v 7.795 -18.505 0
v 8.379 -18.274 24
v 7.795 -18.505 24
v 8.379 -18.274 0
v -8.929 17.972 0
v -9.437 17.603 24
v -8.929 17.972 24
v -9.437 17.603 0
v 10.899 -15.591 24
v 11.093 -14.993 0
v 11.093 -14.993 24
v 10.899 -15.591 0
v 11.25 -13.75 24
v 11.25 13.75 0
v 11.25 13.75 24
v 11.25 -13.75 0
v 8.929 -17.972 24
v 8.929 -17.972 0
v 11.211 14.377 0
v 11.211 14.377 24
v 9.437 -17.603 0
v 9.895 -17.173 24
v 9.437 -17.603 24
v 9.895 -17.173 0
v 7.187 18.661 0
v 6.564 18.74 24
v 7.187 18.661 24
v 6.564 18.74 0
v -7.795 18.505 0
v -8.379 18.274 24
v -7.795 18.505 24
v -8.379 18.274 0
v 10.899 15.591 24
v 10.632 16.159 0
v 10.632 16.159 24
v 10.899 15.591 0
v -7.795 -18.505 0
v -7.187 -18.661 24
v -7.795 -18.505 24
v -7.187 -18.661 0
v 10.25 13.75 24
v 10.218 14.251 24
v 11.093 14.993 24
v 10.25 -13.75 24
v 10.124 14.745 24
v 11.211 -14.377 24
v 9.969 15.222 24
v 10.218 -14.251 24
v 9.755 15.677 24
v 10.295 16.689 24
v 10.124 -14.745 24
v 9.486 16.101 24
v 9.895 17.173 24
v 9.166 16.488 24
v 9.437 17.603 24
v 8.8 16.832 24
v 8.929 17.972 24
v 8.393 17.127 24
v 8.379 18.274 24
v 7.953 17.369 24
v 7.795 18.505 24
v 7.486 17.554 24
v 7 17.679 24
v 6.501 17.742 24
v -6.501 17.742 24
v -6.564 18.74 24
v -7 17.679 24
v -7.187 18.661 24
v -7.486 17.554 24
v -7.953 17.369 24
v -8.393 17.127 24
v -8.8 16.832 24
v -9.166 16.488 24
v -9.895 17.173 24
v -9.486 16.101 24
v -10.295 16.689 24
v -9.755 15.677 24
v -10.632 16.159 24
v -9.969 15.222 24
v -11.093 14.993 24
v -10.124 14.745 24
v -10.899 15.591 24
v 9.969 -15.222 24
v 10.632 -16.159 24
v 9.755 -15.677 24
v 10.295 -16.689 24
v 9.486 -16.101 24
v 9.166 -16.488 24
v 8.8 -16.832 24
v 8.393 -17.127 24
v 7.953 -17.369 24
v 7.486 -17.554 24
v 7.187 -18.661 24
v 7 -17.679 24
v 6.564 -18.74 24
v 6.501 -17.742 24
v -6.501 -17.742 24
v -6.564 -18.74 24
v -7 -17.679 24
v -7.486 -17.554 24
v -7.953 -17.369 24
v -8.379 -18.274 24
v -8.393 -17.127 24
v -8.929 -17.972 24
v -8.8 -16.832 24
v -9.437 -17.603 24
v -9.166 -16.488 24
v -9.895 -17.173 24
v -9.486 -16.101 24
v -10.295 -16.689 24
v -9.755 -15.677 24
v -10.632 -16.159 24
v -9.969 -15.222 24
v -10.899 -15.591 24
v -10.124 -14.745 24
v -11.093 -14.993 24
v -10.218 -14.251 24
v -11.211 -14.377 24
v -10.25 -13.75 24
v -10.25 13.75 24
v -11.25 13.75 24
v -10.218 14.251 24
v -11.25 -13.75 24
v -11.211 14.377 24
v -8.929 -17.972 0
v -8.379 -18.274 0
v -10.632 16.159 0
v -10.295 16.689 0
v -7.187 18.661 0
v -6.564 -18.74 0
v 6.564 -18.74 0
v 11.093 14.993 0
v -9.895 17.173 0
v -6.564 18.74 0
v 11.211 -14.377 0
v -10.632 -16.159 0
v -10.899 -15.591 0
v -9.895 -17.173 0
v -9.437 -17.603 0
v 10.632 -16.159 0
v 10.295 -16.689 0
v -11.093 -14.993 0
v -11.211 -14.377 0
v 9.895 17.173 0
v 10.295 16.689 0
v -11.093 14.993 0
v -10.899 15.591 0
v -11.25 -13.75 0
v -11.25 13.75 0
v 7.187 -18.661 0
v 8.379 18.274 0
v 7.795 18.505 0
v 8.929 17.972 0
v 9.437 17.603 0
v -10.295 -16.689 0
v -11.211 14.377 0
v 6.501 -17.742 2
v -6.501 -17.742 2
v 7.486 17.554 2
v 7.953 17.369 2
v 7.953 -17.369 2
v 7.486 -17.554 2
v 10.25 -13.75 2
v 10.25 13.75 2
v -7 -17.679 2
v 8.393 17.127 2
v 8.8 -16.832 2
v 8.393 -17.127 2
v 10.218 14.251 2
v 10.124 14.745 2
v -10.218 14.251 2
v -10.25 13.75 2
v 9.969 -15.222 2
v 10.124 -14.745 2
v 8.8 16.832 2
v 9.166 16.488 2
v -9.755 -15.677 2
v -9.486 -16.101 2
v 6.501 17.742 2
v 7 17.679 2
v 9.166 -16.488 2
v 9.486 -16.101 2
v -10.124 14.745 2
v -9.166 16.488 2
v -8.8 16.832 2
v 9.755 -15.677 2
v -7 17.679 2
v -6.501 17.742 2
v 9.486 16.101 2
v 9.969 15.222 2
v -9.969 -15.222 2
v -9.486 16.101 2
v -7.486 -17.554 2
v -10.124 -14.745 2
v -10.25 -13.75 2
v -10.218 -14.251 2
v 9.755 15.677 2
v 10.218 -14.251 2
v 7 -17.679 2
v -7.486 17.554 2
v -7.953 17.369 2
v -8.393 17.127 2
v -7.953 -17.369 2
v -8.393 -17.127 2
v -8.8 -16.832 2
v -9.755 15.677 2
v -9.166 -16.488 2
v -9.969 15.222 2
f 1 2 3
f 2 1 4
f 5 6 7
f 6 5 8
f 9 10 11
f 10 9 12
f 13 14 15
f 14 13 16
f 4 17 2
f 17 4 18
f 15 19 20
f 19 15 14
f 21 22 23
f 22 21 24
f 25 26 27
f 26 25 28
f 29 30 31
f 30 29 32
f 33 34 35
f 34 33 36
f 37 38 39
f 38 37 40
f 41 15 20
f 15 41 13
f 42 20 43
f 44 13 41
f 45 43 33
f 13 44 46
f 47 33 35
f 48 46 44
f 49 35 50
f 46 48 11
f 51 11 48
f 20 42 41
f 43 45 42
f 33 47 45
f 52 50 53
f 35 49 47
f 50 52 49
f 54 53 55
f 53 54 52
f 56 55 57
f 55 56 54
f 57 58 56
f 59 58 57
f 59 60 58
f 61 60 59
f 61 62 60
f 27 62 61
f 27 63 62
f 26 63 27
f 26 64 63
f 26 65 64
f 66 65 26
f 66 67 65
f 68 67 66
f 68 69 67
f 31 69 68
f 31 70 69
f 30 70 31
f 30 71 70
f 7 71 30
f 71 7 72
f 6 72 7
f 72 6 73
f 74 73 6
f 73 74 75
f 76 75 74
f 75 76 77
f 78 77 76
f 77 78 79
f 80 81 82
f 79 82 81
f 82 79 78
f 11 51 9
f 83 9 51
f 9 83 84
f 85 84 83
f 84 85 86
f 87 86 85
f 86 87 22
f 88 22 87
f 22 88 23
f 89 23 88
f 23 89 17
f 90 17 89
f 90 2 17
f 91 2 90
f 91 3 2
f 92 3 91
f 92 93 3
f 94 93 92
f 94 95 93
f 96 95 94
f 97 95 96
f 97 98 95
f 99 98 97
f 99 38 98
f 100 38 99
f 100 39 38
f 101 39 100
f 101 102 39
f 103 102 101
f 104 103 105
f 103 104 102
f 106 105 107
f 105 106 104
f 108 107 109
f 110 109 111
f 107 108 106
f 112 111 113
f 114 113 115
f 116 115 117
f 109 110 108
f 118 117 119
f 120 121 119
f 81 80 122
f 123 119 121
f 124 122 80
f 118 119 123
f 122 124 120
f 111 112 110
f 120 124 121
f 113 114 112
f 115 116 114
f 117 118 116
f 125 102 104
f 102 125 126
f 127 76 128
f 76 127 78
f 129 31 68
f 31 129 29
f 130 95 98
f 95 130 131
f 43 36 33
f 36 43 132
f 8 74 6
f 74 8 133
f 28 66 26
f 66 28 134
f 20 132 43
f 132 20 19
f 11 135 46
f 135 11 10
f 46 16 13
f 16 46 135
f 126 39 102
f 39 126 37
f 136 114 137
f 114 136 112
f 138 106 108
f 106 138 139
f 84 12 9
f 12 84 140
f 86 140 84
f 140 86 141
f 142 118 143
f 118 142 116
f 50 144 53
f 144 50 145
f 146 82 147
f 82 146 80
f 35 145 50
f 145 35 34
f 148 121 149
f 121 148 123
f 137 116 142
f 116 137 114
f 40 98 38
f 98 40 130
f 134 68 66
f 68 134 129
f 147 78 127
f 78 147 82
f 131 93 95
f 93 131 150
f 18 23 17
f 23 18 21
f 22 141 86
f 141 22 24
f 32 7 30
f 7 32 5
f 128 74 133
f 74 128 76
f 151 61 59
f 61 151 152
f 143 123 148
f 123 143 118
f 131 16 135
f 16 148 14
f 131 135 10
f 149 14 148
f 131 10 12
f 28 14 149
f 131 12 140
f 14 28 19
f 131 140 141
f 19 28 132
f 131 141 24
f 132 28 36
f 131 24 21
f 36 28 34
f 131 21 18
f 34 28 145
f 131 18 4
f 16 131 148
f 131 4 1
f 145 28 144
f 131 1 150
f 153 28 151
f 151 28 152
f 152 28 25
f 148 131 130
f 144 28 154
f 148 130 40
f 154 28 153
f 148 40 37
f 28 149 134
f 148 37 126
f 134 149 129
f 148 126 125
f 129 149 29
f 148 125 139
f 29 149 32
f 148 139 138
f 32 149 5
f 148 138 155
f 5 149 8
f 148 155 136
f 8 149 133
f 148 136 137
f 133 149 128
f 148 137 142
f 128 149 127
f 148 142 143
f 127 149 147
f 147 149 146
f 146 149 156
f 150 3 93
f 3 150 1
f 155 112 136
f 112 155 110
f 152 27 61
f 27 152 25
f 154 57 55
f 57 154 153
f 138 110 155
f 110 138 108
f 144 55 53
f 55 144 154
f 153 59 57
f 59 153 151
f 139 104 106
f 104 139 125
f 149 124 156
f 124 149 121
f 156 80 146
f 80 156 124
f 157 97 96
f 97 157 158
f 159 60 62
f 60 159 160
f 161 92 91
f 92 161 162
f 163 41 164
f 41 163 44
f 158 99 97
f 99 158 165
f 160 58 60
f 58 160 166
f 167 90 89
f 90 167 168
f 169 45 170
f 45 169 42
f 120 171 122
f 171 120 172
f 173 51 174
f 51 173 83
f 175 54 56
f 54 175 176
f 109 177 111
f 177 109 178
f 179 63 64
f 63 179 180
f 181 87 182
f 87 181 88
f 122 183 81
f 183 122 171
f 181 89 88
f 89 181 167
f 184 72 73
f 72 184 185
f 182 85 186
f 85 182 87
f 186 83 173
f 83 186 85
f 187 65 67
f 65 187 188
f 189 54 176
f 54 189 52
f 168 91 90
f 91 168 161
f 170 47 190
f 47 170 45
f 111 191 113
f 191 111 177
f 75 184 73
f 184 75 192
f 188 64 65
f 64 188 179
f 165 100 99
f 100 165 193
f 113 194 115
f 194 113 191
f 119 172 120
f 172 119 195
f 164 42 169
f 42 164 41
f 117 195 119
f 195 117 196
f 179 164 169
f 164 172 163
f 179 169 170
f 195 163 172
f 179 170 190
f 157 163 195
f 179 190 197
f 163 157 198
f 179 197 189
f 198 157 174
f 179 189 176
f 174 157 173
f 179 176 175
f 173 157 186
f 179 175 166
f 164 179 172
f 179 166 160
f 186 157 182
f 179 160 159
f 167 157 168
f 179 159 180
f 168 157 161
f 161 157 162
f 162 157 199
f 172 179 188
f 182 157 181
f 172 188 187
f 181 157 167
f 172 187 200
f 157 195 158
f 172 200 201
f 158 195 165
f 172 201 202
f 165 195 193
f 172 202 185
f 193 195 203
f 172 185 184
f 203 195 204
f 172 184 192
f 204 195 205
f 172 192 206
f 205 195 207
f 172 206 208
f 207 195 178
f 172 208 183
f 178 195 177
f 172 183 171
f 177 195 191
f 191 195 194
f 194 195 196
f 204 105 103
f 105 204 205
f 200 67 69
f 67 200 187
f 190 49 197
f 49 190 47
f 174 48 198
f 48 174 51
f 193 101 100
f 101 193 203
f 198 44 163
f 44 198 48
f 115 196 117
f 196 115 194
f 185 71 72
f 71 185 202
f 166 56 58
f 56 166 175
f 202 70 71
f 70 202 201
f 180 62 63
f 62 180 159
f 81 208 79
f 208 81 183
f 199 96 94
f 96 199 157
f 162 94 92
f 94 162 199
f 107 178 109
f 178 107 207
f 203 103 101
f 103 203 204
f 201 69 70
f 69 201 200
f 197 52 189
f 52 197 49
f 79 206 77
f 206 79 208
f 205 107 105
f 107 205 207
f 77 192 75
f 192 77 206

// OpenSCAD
$fn = 50;


difference() {
	union() {
		hull() {
			translate(v = [-6.2500000000, 13.7500000000, 0]) {
				cylinder(h = 24, r = 5);
			}
			translate(v = [6.2500000000, 13.7500000000, 0]) {
				cylinder(h = 24, r = 5);
			}
			translate(v = [-6.2500000000, -13.7500000000, 0]) {
				cylinder(h = 24, r = 5);
			}
			translate(v = [6.2500000000, -13.7500000000, 0]) {
				cylinder(h = 24, r = 5);
			}
		}
	}
	union() {
		translate(v = [0, 0, 2]) {
			hull() {
				translate(v = [-6.2500000000, 13.7500000000, 0]) {
					cylinder(h = 22, r = 4);
				}
				translate(v = [6.2500000000, 13.7500000000, 0]) {
					cylinder(h = 22, r = 4);
				}
				translate(v = [-6.2500000000, -13.7500000000, 0]) {
					cylinder(h = 22, r = 4);
				}
				translate(v = [6.2500000000, -13.7500000000, 0]) {
					cylinder(h = 22, r = 4);
				}
			}
		}
	}
}
